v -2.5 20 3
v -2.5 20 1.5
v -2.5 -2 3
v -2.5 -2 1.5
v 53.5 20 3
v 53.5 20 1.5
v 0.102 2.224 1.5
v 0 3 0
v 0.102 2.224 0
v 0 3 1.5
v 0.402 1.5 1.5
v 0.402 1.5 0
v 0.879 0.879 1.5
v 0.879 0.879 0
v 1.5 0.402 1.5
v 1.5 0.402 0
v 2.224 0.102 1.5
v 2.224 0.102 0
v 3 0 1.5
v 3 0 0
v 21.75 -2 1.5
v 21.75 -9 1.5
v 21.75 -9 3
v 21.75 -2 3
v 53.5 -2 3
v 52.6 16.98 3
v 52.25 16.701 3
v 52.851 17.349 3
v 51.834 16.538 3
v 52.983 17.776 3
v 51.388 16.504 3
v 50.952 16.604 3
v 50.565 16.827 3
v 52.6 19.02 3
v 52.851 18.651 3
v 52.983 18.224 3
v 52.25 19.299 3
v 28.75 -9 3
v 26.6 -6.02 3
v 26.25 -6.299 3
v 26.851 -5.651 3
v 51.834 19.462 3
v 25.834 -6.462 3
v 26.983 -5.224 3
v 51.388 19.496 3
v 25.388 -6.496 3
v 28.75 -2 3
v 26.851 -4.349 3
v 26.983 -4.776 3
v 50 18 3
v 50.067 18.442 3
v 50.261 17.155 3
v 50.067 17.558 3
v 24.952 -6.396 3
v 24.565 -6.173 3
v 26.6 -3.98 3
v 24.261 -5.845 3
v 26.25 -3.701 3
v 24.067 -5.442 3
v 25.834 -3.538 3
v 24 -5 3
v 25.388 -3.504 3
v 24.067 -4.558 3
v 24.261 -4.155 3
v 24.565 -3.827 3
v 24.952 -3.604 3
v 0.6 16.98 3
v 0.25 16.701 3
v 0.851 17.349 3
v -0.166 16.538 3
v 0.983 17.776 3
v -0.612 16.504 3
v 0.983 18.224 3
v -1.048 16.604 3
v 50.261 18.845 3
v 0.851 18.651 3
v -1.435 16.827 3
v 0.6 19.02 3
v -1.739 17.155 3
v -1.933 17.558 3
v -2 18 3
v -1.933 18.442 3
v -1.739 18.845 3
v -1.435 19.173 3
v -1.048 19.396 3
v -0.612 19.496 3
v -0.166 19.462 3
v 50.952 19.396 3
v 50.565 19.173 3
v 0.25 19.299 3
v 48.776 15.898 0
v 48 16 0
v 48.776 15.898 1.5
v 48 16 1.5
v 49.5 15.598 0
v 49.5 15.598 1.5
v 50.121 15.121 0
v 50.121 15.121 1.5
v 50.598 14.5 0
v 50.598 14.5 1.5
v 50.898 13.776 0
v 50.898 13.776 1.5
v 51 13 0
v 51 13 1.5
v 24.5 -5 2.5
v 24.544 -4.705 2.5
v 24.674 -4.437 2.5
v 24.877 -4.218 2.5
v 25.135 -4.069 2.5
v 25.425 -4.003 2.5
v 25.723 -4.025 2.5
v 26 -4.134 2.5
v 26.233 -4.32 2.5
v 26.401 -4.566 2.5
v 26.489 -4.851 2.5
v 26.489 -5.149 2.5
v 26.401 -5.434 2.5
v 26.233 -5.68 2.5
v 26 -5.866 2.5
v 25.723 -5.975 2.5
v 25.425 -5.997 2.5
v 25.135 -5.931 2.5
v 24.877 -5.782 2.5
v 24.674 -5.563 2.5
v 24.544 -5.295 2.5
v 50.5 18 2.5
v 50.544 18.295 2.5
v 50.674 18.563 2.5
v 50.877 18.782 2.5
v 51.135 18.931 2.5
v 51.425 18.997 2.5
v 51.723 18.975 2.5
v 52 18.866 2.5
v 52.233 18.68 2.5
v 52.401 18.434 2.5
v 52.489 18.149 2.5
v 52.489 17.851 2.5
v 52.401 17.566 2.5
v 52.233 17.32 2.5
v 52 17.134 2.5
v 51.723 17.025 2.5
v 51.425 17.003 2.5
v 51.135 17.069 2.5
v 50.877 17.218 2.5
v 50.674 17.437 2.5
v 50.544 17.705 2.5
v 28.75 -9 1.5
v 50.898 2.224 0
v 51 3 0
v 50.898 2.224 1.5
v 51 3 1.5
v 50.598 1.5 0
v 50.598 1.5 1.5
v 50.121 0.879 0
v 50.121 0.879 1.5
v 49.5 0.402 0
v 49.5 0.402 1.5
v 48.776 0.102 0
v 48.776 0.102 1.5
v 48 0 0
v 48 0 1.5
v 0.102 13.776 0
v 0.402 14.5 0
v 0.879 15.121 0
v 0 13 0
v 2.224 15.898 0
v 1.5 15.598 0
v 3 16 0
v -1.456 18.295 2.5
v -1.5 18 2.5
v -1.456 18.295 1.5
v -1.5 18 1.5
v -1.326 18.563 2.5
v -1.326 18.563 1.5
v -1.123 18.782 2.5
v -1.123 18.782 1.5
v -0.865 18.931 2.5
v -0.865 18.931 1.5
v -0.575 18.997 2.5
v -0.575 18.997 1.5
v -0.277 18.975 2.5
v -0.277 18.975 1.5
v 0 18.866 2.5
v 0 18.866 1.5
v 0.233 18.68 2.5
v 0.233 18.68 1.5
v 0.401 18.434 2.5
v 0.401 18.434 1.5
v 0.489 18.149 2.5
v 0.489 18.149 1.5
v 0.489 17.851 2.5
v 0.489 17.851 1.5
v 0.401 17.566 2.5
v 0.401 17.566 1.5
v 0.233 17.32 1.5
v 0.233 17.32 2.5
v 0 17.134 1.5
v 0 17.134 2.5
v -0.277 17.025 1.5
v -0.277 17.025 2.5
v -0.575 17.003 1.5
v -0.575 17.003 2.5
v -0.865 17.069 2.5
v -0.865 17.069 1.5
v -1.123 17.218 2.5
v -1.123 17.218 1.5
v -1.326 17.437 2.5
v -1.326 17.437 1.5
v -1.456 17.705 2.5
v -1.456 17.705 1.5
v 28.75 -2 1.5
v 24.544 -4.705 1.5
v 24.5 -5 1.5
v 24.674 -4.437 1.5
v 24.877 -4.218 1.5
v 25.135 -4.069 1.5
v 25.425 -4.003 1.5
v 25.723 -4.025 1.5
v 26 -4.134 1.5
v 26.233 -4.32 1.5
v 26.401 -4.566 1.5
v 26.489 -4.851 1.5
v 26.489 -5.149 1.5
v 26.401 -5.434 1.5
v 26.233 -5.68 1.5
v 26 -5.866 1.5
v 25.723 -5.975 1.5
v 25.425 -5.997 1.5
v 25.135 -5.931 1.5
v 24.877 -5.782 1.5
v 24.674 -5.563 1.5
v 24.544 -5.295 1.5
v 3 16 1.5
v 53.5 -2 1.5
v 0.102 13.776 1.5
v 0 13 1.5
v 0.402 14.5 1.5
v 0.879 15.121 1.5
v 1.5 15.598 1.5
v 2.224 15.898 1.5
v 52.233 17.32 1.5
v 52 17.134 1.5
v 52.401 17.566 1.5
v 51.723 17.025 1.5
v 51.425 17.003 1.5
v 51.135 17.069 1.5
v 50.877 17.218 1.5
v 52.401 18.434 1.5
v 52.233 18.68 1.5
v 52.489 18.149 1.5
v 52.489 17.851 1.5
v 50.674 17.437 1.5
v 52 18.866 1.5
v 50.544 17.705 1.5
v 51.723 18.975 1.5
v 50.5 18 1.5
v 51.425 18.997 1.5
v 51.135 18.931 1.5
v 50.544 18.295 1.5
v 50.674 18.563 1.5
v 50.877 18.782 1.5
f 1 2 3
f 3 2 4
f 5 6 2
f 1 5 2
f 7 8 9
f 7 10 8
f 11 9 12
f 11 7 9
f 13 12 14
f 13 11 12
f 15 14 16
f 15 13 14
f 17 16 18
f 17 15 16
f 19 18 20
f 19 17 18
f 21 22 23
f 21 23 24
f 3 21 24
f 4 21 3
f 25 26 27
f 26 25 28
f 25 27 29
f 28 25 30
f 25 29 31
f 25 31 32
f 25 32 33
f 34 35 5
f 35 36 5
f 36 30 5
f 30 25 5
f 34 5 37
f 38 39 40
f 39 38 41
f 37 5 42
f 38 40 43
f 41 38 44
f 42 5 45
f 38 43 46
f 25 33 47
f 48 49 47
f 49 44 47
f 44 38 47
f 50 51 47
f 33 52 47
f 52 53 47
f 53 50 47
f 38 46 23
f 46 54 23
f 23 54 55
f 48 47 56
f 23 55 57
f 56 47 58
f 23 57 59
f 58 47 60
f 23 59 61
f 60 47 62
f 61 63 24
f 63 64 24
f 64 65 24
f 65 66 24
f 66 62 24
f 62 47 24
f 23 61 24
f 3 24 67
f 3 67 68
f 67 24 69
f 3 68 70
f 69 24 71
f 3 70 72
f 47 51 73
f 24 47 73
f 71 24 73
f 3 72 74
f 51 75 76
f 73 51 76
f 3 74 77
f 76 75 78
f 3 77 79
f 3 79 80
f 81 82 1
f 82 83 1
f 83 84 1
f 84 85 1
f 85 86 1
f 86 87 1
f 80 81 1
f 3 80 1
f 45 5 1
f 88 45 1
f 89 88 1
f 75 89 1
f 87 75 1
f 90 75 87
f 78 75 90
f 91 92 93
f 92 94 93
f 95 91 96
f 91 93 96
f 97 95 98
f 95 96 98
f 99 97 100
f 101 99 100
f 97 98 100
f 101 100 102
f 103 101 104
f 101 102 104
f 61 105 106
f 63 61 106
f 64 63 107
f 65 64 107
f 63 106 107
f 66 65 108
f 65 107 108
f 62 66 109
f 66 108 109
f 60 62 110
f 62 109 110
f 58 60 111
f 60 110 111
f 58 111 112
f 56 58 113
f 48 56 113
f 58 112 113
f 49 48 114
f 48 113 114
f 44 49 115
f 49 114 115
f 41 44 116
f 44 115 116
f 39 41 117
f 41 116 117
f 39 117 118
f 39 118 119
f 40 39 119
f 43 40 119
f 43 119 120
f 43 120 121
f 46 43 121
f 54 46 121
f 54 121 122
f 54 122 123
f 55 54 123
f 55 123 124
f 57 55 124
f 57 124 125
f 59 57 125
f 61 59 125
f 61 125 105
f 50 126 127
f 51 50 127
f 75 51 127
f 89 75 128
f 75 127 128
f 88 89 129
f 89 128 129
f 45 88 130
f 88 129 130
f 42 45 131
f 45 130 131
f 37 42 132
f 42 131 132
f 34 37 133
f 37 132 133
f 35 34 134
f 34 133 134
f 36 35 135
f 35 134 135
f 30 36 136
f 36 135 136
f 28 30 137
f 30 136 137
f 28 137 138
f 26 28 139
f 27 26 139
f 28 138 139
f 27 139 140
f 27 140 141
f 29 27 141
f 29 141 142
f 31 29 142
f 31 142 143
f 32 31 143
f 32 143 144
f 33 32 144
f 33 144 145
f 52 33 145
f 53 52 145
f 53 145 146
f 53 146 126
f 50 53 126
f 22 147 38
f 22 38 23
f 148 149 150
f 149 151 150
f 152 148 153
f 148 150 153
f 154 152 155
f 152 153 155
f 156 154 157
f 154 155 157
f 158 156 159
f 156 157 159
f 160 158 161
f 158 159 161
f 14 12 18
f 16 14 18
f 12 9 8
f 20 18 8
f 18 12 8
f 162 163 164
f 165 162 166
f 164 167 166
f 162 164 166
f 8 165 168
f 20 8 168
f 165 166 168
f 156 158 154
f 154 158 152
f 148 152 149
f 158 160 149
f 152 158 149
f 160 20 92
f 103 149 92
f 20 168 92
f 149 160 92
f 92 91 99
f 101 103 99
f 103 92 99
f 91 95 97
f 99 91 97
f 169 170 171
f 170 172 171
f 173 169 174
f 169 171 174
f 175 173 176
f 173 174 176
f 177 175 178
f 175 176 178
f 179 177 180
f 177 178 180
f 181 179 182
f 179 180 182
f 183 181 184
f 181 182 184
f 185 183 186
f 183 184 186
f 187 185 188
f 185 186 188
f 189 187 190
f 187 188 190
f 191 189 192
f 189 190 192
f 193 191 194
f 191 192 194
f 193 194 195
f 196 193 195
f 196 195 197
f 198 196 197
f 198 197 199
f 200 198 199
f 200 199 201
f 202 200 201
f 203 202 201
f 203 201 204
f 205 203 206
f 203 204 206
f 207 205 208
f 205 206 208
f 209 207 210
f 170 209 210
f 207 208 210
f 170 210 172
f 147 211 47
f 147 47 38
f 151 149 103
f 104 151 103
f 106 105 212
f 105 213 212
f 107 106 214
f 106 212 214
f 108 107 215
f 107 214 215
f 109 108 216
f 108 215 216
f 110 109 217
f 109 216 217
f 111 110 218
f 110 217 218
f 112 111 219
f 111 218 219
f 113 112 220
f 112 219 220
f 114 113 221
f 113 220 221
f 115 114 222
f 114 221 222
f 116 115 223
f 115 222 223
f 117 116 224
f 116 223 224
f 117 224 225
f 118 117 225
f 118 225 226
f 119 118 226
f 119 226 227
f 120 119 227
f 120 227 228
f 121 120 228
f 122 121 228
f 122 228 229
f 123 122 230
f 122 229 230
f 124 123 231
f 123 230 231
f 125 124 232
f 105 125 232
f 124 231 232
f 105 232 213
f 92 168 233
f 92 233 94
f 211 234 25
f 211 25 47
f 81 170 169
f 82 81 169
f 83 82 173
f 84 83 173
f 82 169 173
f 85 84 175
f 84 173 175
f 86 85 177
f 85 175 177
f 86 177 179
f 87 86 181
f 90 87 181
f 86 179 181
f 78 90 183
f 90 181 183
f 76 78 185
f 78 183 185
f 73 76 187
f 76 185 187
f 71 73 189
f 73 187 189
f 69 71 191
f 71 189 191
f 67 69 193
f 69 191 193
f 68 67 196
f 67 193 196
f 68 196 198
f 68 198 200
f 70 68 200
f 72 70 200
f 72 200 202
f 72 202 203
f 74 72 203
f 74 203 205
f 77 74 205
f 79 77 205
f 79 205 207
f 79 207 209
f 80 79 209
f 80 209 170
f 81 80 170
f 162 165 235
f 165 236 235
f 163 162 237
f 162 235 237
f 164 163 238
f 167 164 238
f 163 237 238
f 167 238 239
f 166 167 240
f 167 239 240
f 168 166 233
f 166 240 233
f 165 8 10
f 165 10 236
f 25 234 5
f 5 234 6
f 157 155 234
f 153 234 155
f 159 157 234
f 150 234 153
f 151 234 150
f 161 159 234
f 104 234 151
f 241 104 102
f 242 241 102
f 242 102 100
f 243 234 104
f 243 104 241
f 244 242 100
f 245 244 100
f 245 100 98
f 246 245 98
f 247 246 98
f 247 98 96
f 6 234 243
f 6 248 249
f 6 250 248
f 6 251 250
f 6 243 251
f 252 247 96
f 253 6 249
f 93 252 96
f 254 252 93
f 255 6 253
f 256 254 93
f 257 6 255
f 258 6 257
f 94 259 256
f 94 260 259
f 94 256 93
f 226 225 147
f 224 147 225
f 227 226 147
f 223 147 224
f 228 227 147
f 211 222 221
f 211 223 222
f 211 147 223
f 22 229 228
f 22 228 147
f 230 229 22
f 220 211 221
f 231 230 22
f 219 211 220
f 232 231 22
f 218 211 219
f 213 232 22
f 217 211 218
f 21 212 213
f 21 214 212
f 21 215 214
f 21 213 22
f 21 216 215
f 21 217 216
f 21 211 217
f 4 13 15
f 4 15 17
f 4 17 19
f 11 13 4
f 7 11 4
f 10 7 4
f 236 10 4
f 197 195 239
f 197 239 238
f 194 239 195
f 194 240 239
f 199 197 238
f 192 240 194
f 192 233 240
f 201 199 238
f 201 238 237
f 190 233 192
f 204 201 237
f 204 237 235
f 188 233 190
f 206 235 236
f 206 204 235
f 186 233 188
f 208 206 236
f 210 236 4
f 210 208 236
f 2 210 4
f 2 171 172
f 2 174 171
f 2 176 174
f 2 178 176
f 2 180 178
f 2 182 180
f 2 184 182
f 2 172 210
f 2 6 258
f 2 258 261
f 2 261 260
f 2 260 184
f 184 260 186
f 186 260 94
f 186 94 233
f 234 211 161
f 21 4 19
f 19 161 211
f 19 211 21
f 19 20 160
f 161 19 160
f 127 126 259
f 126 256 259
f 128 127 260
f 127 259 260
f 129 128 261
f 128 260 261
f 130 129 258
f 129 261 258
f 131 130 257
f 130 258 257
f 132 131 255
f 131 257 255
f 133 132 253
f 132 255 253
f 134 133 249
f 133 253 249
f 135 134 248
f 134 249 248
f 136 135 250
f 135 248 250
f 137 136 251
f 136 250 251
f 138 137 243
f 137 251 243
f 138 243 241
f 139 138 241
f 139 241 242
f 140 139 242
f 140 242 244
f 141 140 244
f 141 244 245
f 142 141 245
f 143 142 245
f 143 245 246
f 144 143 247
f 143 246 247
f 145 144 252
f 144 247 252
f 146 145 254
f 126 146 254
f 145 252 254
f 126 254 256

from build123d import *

# Parameters (mm, degrees)
SKETCH_1_W                  = 51
SKETCH_1_H                  = 16
EXTRUDE_1_DEPTH             = 1.5
EXTRUDE_2_DEPTH             = 1.5
FILLET_2_R                  = 3
HOLE_WIZARD_M21_D           = 2
HOLE_WIZARD_M21_CSINK_D     = 3
HOLE_WIZARD_M21_CSINK_ANGLE = 90


with BuildPart() as part:
    # Эскиз1 → Бобышка-Вытянуть1 (new body)
    with BuildSketch(Plane.XY):
        with Locations((25.5, 8)):
            Rectangle(SKETCH_1_W, SKETCH_1_H)
    extrude(amount=EXTRUDE_1_DEPTH)

    # Эскиз2 → Бобышка-Вытянуть2 (add)
    with BuildSketch(Plane.XY.offset(1.5)):
        Polygon((3.5, 20), (47.5, 20), (53.5, 20), (53.5, 19.5), (53.5, -2), (28.75, -2), (28.75, -9), (21.75, -9), (21.75, -2), (-2.5, -2), (-2.5, 19.5), (-2.5, 20), align=None)
    extrude(amount=EXTRUDE_2_DEPTH)

    # Скругление2
    fillet_2_edges = [part.edges().sort_by_distance(p)[0] for p in [
        (0, 0, 0.75),
        (0, 16, 0.75),
        (51, 16, 0.75),
        (51, 0, 0.75),
    ]]
    fillet(fillet_2_edges, radius=FILLET_2_R)

    # Зенковка для  винта с полупотайной головкой M21 (through all)
    with Locations(Plane.XY.offset(3)):
        with Locations((25.5, -5), (-0.5, 18), (51.5, 18)):
            CounterSinkHole(HOLE_WIZARD_M21_D / 2, HOLE_WIZARD_M21_CSINK_D / 2, counter_sink_angle=HOLE_WIZARD_M21_CSINK_ANGLE)


solid = part.part
